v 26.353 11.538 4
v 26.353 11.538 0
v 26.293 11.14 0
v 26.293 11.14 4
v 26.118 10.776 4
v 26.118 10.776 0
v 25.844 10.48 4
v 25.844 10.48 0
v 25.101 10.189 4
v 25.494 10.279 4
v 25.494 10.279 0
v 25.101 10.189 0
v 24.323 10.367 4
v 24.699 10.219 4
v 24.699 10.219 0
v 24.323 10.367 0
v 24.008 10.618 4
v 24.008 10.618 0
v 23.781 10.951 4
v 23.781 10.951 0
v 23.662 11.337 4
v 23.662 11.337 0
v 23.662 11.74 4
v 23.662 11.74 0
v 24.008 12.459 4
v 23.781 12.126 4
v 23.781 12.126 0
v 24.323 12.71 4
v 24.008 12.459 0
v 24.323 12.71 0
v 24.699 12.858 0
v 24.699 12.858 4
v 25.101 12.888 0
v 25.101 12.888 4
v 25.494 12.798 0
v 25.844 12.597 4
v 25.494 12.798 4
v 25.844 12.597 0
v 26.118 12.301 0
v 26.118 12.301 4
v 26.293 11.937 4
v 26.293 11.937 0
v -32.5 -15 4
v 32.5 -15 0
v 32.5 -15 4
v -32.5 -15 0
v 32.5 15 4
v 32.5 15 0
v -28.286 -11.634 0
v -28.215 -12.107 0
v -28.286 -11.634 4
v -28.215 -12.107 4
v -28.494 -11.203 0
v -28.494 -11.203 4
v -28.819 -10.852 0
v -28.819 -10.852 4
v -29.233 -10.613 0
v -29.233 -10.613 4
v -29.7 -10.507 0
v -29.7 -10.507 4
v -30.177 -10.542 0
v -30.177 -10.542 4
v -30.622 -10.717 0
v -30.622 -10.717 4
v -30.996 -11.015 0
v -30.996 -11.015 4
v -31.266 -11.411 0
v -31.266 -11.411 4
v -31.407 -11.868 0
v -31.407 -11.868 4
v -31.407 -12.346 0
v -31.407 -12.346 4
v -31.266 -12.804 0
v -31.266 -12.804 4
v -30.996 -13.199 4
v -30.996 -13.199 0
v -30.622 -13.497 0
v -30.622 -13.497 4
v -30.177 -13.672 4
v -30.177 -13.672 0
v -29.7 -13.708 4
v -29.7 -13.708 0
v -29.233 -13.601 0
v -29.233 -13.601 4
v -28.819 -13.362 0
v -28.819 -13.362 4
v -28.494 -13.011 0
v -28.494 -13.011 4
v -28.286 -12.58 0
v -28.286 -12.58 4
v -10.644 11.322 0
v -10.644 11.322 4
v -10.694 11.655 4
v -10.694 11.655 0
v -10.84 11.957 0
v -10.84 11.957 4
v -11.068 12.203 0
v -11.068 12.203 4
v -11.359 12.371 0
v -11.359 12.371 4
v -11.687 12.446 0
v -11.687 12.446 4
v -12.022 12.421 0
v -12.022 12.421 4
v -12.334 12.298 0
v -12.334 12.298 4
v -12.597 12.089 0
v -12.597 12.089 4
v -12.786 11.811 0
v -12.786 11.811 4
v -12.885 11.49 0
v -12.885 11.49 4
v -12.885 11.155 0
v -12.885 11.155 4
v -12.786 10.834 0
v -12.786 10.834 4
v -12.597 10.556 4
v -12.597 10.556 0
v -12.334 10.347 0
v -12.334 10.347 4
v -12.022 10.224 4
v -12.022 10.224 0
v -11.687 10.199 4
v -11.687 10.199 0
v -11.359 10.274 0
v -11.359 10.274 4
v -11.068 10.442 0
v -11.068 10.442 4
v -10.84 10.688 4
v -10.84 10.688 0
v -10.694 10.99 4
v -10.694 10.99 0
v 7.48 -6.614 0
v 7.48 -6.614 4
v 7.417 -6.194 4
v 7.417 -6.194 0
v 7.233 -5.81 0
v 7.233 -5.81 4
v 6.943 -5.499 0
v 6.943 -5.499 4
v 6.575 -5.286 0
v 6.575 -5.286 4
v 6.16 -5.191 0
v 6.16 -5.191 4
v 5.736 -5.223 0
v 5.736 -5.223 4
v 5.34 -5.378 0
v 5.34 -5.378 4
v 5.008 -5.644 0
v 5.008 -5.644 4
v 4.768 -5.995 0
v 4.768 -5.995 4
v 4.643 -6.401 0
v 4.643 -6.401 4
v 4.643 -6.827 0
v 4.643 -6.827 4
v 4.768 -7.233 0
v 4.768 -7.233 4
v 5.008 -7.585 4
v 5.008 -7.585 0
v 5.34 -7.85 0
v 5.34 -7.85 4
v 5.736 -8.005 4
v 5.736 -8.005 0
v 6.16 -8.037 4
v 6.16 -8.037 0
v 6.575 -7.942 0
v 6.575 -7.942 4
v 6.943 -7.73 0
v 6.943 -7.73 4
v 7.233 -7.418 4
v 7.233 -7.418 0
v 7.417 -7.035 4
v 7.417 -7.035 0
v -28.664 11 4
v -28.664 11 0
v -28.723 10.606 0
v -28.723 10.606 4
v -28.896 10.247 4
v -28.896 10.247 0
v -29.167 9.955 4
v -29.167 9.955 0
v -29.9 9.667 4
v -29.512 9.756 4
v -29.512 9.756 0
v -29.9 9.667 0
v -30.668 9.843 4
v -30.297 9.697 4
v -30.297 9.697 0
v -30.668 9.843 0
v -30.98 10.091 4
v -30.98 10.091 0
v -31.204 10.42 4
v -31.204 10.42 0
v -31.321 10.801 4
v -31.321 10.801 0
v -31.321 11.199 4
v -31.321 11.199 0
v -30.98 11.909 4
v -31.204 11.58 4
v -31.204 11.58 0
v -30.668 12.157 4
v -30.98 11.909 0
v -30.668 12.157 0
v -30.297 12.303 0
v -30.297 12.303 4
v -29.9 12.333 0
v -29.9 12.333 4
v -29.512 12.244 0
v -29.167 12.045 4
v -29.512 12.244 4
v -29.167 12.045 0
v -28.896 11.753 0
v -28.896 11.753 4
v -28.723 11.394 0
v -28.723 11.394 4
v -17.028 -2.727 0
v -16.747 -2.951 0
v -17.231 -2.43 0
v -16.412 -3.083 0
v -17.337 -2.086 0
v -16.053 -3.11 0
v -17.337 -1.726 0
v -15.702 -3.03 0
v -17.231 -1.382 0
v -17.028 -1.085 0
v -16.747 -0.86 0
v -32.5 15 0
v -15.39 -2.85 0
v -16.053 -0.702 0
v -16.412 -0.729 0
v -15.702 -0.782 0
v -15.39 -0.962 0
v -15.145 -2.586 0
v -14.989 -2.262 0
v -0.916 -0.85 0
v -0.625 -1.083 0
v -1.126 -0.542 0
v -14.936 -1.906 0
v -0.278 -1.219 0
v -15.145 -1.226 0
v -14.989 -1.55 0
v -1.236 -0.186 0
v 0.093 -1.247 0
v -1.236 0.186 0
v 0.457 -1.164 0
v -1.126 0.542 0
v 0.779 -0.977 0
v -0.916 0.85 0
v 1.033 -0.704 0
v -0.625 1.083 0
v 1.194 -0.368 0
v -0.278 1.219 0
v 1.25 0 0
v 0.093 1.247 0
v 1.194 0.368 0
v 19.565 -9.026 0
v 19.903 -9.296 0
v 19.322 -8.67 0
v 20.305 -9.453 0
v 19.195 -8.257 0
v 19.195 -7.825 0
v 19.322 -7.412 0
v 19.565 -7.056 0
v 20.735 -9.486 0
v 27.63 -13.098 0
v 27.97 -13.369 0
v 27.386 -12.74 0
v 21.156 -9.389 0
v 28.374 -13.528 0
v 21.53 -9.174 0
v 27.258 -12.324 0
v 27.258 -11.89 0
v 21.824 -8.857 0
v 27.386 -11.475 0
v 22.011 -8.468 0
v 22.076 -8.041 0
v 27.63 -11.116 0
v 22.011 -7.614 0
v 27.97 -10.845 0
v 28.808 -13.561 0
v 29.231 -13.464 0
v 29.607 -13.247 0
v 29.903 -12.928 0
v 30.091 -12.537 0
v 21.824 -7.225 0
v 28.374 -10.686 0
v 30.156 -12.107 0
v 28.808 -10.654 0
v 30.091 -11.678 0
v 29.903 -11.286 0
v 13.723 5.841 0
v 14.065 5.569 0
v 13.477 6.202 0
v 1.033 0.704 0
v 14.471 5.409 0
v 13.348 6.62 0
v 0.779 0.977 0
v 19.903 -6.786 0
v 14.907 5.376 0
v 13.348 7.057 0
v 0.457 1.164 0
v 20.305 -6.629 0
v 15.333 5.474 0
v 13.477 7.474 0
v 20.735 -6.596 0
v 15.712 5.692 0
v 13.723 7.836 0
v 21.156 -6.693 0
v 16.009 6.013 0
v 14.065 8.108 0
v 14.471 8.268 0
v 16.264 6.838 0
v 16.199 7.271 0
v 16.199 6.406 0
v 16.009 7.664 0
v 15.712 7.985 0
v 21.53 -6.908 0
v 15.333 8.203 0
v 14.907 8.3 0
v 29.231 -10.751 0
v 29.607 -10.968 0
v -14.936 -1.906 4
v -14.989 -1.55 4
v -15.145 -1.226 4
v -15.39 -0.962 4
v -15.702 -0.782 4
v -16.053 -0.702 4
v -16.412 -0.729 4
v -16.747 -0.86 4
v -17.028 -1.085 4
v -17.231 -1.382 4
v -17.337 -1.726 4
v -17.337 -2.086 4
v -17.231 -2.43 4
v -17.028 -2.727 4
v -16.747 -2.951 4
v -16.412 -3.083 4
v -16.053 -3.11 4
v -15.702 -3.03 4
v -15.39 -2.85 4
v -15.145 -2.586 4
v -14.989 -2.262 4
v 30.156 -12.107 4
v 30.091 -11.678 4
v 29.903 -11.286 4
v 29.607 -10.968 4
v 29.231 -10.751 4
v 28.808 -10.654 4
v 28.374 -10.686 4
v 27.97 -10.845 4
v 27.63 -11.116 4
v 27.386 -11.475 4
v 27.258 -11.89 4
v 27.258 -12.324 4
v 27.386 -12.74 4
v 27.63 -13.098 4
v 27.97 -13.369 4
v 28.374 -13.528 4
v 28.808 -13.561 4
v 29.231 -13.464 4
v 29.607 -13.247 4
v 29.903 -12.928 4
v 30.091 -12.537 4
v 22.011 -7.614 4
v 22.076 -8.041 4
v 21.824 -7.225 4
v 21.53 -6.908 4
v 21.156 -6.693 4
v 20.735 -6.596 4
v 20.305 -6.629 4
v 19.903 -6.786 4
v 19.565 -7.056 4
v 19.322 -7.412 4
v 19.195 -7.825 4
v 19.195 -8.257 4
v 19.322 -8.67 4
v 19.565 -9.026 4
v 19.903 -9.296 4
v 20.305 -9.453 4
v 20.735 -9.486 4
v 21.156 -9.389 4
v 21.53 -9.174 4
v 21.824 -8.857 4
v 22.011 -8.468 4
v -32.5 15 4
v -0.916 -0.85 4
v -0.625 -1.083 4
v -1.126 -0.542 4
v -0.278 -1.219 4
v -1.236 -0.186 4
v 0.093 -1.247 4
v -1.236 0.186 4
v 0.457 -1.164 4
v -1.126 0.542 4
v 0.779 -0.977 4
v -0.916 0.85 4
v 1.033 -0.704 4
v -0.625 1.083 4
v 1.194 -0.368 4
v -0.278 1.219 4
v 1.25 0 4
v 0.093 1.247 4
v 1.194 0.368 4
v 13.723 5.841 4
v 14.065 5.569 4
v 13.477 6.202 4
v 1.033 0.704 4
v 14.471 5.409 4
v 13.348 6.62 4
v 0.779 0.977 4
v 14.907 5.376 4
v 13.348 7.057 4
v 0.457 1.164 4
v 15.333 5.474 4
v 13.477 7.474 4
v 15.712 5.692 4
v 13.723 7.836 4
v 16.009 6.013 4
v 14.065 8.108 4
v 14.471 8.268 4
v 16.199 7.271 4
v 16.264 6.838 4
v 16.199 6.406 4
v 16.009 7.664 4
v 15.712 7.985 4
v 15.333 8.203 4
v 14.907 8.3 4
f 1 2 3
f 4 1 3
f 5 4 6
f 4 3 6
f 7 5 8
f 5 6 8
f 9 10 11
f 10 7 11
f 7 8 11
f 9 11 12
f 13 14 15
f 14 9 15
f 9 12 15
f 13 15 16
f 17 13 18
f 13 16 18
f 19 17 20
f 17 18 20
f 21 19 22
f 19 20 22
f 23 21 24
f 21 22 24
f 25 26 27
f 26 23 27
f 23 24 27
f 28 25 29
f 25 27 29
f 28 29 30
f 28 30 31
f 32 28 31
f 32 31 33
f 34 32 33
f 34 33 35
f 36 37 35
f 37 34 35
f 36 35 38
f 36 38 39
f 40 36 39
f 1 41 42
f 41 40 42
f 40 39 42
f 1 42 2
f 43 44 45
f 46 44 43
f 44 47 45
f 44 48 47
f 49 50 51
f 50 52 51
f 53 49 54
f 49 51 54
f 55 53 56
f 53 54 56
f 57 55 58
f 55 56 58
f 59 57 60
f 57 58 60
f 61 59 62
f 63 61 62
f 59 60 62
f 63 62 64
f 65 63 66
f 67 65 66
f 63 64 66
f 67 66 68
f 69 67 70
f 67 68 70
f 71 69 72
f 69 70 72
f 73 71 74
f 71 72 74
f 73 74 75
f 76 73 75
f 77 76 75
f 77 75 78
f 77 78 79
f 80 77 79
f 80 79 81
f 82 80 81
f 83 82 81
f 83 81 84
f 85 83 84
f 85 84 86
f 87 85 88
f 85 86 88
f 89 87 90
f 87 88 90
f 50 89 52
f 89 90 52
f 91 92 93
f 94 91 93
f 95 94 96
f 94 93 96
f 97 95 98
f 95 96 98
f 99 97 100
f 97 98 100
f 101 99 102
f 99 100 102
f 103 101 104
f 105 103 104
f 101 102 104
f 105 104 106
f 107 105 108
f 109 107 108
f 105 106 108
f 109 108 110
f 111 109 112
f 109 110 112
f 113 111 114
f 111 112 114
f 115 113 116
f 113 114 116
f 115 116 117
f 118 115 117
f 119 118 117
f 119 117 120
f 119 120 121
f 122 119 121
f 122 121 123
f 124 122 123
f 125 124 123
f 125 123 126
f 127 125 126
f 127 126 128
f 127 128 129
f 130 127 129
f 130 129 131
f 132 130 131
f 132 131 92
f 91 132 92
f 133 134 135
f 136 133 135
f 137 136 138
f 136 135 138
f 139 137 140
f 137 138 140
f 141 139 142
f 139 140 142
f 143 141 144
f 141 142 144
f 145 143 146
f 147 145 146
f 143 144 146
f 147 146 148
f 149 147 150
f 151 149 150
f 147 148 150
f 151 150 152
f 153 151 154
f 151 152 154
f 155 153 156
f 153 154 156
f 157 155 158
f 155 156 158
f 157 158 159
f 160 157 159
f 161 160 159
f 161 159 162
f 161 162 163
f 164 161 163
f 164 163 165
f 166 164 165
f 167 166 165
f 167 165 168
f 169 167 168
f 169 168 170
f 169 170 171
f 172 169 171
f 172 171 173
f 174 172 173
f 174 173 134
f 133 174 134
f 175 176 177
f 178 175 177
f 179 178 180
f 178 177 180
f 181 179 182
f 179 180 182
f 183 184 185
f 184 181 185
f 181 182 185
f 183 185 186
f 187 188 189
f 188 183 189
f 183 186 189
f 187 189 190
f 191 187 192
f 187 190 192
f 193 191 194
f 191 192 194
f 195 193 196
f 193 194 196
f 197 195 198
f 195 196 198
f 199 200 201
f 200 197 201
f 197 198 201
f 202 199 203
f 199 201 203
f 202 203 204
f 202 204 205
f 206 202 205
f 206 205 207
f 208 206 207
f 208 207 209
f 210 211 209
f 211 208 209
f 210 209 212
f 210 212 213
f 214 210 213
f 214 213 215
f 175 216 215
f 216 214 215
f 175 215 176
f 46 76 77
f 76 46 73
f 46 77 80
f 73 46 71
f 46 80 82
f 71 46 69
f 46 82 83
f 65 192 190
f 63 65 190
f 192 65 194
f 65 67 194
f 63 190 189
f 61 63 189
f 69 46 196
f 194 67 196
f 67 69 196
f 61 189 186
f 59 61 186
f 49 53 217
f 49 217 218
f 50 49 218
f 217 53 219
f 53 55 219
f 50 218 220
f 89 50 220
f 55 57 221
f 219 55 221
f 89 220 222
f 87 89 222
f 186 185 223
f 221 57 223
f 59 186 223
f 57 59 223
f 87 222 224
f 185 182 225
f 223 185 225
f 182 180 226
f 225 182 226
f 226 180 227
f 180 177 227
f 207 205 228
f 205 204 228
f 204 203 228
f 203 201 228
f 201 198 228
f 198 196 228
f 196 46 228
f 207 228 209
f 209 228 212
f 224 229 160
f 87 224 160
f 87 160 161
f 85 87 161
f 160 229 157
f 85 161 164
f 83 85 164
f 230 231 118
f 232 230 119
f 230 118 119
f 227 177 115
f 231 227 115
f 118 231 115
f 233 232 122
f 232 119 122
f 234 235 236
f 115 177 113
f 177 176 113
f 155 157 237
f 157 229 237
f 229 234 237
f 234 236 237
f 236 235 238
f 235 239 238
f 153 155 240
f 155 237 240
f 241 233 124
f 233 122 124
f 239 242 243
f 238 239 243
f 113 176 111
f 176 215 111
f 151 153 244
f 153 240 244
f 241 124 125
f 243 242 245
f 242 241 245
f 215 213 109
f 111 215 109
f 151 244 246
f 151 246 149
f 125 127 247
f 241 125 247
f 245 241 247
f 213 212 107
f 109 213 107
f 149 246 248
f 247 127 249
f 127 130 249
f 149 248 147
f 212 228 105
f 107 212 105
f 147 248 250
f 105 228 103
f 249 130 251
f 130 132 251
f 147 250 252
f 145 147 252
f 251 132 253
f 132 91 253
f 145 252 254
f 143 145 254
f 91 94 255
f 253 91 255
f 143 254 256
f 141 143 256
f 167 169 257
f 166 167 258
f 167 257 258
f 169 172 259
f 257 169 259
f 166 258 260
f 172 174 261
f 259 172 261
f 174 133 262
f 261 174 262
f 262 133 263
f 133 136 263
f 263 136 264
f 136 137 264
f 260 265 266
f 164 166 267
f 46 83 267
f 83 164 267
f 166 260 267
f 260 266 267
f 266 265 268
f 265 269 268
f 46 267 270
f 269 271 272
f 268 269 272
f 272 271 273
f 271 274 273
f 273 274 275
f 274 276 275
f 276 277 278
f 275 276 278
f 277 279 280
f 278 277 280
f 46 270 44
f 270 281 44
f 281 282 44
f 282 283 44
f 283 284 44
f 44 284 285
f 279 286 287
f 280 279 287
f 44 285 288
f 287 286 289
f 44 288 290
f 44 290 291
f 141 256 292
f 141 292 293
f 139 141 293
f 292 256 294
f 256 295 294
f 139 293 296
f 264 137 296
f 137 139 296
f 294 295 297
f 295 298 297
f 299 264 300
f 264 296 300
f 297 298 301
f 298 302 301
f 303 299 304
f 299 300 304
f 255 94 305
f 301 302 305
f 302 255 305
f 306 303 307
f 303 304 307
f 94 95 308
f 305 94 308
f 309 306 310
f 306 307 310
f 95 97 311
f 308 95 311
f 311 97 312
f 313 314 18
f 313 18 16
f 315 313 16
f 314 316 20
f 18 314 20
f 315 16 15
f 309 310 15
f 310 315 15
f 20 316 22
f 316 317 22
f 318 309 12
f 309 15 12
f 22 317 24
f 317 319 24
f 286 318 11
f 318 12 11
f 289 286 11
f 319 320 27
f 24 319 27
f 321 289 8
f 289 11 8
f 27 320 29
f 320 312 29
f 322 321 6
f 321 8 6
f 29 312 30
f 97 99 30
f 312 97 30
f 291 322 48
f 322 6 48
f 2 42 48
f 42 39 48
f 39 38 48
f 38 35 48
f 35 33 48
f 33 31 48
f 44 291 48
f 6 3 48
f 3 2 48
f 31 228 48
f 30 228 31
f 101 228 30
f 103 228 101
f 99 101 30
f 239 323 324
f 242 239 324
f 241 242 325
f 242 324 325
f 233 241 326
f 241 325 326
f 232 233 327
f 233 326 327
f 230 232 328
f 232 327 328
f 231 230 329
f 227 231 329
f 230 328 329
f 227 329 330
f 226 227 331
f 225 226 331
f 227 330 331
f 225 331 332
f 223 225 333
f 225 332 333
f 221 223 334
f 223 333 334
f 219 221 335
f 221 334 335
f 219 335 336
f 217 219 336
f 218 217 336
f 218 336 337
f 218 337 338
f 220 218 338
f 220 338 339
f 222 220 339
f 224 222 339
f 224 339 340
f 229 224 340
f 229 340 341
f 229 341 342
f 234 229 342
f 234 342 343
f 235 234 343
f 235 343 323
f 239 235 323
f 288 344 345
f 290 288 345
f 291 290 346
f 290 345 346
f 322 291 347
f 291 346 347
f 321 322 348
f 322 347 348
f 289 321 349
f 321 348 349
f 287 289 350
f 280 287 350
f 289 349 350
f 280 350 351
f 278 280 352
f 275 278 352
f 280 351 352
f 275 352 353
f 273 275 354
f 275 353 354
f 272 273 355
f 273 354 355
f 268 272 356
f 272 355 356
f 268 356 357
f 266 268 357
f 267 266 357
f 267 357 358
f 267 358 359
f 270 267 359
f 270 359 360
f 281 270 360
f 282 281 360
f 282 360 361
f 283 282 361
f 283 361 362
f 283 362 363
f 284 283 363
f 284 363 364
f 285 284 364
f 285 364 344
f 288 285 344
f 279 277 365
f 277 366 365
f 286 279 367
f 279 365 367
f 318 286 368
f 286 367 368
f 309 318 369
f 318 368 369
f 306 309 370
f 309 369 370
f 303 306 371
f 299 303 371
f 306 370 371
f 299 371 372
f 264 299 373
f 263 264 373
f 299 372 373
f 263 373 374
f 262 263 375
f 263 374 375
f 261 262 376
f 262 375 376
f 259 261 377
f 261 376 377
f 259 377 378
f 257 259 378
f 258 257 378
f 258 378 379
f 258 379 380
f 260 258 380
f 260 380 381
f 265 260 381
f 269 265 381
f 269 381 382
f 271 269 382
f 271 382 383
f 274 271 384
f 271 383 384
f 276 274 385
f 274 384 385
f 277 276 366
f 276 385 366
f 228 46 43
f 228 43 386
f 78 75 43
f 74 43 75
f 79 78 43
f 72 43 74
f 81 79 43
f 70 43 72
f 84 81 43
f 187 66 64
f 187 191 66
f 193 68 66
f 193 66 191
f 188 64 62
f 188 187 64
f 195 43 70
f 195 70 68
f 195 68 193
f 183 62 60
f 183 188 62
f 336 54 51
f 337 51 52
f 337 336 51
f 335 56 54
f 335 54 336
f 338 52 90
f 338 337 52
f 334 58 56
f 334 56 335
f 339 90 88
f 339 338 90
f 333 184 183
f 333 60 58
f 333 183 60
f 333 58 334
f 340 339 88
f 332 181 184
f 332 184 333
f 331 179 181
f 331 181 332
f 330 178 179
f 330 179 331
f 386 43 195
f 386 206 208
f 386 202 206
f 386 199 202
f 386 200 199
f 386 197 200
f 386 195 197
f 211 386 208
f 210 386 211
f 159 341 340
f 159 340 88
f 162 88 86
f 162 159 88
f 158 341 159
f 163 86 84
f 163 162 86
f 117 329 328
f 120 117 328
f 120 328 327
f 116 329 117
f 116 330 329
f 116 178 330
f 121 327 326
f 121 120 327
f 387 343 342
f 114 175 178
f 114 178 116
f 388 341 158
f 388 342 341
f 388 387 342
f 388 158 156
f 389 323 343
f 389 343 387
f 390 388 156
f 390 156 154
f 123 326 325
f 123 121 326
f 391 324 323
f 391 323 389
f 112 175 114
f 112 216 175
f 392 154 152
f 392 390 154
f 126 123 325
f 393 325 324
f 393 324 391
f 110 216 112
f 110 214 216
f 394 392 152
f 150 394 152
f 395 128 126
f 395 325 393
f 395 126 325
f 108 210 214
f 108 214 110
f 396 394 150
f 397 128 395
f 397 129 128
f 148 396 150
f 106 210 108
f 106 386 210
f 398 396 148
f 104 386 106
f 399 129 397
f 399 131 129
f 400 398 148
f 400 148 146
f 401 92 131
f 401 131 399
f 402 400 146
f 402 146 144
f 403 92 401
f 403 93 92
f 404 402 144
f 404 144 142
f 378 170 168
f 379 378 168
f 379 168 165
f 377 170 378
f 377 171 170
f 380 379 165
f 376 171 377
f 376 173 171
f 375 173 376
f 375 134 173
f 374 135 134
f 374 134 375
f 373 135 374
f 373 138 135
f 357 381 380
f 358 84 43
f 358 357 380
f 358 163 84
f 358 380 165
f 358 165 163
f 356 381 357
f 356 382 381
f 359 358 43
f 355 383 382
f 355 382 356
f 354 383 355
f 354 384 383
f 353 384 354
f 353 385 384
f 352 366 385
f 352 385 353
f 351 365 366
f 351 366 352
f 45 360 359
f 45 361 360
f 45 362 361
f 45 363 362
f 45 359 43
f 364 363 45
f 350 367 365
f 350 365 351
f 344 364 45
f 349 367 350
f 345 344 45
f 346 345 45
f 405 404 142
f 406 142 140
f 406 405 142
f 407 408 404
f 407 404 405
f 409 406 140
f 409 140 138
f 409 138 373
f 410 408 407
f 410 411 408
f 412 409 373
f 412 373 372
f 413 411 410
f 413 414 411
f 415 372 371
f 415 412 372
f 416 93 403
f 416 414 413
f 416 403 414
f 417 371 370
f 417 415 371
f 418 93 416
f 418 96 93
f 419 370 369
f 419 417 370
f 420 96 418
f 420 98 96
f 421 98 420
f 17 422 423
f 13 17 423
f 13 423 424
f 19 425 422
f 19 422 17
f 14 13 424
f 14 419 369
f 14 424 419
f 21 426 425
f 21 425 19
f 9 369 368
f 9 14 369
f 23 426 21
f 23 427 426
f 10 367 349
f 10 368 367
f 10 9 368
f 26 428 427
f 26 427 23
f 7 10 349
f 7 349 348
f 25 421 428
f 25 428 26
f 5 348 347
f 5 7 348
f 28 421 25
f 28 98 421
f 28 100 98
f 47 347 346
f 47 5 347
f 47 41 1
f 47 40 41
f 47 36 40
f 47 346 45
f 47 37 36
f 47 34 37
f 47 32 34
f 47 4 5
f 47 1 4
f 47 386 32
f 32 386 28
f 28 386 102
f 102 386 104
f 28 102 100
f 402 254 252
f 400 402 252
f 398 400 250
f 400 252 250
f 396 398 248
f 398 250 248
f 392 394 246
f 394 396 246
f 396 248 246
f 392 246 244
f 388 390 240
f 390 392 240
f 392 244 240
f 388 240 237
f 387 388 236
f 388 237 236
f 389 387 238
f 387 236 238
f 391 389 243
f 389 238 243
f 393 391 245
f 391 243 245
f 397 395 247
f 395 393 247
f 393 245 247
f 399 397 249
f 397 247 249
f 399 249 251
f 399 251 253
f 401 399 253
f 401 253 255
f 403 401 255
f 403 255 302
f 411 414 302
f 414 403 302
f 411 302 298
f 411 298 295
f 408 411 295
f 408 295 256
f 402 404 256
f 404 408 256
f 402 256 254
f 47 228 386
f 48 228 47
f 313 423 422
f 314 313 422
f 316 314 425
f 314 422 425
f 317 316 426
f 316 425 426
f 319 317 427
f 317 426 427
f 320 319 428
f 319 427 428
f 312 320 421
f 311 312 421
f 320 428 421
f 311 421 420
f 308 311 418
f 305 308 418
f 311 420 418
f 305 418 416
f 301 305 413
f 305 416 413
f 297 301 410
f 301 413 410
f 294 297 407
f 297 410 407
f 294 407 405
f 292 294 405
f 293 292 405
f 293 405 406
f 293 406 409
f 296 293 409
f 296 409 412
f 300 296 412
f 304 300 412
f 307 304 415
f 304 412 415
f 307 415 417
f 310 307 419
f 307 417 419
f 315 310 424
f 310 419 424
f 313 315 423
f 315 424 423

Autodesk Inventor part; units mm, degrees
ref_plane "YZ Plane" through (0, 0, 0) normal (1, 0, 0) x (0, 1, 0)
ref_plane "XZ Plane" through (0, 0, 0) normal (0, 1, 0) x (-1, 0, 0)
ref_plane "XY Plane" through (0, 0, 0) normal (0, 0, 1) x (1, 0, 0)
sketch "Sketch1" plane through (0, 0, 0) normal (0, 0, 1) x (1, 0, 0)
  line L0 (32.5, -15) -> (-32.5, -15)
  line L1 (-32.5, -15) -> (-32.5, 15)
  line L2 (-32.5, 15) -> (32.5, 15)
  line L3 (32.5, 15) -> (32.5, -15)
  line L4 (32.5, -15) -> (-32.5, 15) construction
  line L5 (-32.5, -15) -> (32.5, 15) construction
  circle A0 centre (0, 0) radius 1.25
  circle A1 centre (-30, 11) radius 1.3364
  circle A2 centre (25, 11.5385) radius 1.3533
  circle A3 centre (31.3333, -14.4615) radius 1.3333
  circle A4 centre (-30, -15) radius 1.3333
  dimension "d0" = 30
  dimension "d1" = 65
  dimension "d2" = 2.5
  dimension "d3" = 26
  dimension "d4" = 26
  dimension "d5" = 55
  dimension "d6" = 25
  dimension "d7" = 15
extrude "Plate1" add sketch "Sketch1" along normal blind 4 contours L0 A3 L3 | L0 A4 L1 L2 L3 A3 | L0 A4 picked at (30.9112, -14.2924) picked at (-29.6065, -14.7935)
sketch "Sketch2" plane through (0, 0, 4) normal (0, 0, 1) x (1, 0, 0)
  circle A0 centre (-29.8197, -12.1072) radius 1.6051
  circle A1 centre (28.6987, -12.1072) radius 1.4574
  point P0 (0, 0)
extrude "Extrusion1" cut sketch "Sketch2" against normal blind 5
sketch "Sketch3" plane through (0, 0, 4) normal (0, 0, 1) x (1, 0, 0)
  circle A0 centre (-27.5776, 6.8384) radius 0.7927
  circle A1 centre (-28.3703, -3.8115) radius 0.8238
  circle A2 centre (-16.143, -1.9058) radius 1.2074
  circle A3 centre (-11.7709, 11.3225) radius 1.1266
  circle A4 centre (6.0536, -6.6141) radius 1.4269
  circle A5 centre (14.7977, 6.8384) radius 1.466
  circle A6 centre (20.6272, -8.041) radius 1.4486
  point P0 (0, 0)
extrude "Extrusion2" cut sketch "Sketch3" against normal blind 5 contours A2 | A3 | A4 | A5 | A6
equation "\"d8\" = Thickness"
equation "\"BendRadius\" = Thickness"
equation "\"BendReliefWidth\" = Thickness"
equation "\"BendReliefDepth\" = 0.5 * Thickness"
equation "\"CornerReliefSize\" = 4 * Thickness"
equation "\"MinimumRemnant\" = 2 * Thickness"
equation "\"TransitionRadius\" = BendRadius"
equation "\"JacobiRadiusSize\" = BendRadius"
equation "\"GapSize\" = Thickness"
equation "\"Thickness\" = 4"
properties part number "rectanglar"
